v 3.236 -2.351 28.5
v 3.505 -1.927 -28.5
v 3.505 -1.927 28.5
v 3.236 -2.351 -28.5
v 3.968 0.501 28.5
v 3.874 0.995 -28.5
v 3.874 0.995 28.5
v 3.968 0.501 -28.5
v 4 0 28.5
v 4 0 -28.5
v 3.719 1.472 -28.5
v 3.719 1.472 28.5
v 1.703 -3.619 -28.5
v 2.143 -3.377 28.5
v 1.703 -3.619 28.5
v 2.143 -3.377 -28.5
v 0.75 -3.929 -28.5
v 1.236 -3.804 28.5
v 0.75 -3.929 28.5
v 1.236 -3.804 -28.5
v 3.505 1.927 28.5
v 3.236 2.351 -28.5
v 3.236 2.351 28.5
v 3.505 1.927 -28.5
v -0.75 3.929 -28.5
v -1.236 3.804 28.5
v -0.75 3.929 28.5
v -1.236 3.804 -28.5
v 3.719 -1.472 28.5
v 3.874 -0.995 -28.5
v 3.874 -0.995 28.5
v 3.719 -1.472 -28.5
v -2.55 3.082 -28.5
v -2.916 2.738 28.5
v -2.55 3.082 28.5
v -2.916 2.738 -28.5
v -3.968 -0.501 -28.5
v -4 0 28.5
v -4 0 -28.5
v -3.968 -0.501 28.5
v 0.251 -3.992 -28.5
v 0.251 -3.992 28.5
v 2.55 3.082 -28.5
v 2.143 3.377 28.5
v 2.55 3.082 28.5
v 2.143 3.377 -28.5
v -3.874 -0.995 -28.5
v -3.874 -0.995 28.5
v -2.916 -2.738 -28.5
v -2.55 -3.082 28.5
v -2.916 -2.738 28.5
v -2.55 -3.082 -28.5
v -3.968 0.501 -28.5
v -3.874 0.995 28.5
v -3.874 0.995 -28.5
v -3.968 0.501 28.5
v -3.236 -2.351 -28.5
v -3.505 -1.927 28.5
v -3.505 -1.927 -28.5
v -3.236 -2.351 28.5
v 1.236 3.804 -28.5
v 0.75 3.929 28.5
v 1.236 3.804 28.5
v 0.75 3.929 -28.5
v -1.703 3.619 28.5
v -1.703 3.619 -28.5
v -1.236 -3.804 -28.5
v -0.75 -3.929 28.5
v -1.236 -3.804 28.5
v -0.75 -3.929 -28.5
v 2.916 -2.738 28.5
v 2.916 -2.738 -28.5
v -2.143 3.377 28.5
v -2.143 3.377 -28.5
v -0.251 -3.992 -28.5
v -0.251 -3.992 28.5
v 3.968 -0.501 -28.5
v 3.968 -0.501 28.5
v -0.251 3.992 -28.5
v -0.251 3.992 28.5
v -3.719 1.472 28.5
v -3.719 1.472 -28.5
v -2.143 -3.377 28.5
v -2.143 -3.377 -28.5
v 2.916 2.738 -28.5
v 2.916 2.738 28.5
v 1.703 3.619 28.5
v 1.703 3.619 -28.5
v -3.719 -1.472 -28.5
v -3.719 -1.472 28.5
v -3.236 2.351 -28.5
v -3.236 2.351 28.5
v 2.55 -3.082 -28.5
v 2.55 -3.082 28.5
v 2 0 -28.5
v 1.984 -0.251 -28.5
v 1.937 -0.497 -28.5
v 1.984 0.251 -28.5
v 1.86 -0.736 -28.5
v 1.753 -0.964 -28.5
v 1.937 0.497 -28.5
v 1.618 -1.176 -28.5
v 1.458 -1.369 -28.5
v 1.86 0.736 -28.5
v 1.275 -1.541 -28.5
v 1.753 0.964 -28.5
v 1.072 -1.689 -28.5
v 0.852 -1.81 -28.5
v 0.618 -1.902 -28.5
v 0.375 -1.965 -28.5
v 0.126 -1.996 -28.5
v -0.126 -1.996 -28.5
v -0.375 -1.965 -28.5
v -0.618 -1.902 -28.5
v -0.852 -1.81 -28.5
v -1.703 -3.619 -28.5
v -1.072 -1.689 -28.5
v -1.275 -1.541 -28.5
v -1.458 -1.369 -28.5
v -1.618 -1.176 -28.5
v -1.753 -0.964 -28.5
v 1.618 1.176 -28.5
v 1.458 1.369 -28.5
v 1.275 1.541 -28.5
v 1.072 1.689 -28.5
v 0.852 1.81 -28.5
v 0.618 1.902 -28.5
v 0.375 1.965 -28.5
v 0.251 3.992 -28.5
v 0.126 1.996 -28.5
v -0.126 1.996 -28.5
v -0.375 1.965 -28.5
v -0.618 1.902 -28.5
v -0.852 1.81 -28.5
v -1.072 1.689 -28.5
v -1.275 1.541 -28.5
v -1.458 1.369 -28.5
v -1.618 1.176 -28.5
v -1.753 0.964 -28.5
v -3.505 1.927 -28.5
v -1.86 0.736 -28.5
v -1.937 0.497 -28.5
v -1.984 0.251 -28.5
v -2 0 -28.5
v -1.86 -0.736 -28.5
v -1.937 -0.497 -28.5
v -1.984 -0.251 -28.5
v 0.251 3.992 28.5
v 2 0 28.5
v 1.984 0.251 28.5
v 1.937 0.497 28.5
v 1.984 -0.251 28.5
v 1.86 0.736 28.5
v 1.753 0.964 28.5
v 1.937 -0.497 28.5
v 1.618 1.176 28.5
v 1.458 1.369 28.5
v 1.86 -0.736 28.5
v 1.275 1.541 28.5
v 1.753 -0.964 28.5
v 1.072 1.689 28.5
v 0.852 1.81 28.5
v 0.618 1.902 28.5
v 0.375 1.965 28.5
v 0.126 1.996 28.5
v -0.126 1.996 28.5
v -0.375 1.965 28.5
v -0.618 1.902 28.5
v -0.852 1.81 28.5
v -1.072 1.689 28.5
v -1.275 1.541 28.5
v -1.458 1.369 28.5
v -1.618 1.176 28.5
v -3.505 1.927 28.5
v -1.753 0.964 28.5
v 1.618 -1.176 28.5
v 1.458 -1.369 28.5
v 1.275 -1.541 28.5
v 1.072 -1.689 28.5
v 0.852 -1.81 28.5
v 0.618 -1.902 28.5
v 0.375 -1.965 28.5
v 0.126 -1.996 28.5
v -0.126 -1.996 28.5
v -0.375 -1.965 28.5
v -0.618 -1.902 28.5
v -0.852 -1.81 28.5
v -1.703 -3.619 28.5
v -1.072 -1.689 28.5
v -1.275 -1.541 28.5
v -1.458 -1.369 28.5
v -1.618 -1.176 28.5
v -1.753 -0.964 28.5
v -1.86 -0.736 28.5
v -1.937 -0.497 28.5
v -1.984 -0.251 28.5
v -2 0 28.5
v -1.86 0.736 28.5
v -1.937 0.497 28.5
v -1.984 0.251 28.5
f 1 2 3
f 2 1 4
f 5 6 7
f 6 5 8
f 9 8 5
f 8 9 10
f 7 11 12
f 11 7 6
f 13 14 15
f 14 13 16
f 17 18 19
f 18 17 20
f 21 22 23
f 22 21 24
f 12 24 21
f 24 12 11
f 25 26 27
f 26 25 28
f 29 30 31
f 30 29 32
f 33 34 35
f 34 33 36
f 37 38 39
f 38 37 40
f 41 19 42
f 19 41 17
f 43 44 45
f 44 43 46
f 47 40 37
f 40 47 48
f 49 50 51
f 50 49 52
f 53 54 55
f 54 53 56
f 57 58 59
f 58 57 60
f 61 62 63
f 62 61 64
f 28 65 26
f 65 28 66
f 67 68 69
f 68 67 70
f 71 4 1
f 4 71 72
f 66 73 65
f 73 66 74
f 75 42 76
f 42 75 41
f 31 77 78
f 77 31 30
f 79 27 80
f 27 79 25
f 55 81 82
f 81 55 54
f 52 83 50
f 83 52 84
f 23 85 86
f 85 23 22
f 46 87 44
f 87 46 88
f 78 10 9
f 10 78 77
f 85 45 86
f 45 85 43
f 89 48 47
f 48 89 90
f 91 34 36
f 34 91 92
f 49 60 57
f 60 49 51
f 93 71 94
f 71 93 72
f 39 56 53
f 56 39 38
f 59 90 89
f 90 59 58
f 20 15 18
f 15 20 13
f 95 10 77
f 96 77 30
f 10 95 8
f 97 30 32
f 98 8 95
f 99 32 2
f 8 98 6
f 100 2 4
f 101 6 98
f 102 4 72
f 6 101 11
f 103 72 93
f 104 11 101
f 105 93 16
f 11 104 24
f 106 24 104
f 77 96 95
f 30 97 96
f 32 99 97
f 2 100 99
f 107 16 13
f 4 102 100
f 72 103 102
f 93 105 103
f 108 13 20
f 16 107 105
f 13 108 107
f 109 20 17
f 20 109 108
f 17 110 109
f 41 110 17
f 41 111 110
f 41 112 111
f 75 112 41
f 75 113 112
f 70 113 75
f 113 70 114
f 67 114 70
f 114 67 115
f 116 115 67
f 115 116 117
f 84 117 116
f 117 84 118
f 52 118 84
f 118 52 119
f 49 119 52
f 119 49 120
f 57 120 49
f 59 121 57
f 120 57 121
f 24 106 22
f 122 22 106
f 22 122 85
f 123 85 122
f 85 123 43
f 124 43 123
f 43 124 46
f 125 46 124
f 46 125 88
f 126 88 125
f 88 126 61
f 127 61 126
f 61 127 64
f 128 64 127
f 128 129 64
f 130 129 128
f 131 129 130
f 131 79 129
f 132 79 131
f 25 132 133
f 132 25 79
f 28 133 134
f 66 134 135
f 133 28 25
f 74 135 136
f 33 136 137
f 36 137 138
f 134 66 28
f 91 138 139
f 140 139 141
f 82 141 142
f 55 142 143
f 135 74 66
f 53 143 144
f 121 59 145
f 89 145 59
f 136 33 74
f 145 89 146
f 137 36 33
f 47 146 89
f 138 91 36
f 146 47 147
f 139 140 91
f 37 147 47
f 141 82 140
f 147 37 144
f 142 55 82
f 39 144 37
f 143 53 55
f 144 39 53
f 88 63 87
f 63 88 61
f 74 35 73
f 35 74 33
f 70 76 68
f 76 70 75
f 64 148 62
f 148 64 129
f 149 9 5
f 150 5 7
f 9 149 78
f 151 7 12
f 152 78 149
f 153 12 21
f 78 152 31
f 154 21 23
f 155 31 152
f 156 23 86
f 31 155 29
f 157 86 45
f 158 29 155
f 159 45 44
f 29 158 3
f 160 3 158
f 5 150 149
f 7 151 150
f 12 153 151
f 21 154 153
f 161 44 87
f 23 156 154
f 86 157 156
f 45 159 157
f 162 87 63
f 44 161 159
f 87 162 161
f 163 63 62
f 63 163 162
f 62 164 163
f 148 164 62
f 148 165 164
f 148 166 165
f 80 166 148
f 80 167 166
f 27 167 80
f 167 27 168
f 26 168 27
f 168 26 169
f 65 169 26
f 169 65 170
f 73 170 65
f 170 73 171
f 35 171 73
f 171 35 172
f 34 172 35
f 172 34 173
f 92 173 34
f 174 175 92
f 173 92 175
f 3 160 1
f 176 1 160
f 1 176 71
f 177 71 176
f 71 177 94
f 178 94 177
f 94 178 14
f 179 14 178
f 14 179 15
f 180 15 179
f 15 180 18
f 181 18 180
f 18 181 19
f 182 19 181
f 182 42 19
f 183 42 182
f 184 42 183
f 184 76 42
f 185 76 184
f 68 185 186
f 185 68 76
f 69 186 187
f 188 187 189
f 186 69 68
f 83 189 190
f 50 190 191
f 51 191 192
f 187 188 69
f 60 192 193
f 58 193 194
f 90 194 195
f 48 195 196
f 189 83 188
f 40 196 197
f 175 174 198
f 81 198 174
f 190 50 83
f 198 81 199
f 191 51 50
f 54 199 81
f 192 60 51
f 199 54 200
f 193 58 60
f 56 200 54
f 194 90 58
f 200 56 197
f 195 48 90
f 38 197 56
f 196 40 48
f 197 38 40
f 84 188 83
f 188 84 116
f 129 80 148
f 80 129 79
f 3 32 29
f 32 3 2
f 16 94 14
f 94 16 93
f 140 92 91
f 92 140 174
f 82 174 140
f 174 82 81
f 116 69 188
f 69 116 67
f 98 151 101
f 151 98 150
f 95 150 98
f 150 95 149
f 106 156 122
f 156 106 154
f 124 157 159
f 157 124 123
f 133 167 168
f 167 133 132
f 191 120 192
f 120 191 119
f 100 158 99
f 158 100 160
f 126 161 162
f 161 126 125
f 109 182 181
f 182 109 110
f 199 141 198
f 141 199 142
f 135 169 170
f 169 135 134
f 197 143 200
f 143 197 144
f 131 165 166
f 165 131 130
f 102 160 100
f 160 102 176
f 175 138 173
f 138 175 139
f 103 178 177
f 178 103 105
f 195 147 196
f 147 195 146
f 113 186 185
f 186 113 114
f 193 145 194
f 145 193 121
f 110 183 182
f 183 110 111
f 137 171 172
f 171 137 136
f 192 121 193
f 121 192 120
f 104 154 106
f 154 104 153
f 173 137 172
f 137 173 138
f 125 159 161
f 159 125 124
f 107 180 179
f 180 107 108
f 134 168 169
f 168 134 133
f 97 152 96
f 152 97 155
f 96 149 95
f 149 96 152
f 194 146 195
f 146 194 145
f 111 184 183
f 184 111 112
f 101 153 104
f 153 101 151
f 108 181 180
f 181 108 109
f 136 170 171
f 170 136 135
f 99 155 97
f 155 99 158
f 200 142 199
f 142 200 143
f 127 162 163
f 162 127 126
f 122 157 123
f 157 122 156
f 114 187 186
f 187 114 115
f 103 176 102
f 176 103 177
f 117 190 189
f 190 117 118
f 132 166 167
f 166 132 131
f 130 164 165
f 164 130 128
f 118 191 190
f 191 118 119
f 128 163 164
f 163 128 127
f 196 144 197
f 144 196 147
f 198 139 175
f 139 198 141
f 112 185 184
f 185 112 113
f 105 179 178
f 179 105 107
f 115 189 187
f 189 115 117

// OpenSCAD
$fn = 50;


difference() {
	union() {
		translate(v = [0, 0, -28.5000000000]) {
			cylinder(h = 57, r = 4.0000000000);
		}
	}
	union() {
		translate(v = [0, 0, -100.0000000000]) {
			cylinder(h = 200, r = 2.0000000000);
		}
	}
}
